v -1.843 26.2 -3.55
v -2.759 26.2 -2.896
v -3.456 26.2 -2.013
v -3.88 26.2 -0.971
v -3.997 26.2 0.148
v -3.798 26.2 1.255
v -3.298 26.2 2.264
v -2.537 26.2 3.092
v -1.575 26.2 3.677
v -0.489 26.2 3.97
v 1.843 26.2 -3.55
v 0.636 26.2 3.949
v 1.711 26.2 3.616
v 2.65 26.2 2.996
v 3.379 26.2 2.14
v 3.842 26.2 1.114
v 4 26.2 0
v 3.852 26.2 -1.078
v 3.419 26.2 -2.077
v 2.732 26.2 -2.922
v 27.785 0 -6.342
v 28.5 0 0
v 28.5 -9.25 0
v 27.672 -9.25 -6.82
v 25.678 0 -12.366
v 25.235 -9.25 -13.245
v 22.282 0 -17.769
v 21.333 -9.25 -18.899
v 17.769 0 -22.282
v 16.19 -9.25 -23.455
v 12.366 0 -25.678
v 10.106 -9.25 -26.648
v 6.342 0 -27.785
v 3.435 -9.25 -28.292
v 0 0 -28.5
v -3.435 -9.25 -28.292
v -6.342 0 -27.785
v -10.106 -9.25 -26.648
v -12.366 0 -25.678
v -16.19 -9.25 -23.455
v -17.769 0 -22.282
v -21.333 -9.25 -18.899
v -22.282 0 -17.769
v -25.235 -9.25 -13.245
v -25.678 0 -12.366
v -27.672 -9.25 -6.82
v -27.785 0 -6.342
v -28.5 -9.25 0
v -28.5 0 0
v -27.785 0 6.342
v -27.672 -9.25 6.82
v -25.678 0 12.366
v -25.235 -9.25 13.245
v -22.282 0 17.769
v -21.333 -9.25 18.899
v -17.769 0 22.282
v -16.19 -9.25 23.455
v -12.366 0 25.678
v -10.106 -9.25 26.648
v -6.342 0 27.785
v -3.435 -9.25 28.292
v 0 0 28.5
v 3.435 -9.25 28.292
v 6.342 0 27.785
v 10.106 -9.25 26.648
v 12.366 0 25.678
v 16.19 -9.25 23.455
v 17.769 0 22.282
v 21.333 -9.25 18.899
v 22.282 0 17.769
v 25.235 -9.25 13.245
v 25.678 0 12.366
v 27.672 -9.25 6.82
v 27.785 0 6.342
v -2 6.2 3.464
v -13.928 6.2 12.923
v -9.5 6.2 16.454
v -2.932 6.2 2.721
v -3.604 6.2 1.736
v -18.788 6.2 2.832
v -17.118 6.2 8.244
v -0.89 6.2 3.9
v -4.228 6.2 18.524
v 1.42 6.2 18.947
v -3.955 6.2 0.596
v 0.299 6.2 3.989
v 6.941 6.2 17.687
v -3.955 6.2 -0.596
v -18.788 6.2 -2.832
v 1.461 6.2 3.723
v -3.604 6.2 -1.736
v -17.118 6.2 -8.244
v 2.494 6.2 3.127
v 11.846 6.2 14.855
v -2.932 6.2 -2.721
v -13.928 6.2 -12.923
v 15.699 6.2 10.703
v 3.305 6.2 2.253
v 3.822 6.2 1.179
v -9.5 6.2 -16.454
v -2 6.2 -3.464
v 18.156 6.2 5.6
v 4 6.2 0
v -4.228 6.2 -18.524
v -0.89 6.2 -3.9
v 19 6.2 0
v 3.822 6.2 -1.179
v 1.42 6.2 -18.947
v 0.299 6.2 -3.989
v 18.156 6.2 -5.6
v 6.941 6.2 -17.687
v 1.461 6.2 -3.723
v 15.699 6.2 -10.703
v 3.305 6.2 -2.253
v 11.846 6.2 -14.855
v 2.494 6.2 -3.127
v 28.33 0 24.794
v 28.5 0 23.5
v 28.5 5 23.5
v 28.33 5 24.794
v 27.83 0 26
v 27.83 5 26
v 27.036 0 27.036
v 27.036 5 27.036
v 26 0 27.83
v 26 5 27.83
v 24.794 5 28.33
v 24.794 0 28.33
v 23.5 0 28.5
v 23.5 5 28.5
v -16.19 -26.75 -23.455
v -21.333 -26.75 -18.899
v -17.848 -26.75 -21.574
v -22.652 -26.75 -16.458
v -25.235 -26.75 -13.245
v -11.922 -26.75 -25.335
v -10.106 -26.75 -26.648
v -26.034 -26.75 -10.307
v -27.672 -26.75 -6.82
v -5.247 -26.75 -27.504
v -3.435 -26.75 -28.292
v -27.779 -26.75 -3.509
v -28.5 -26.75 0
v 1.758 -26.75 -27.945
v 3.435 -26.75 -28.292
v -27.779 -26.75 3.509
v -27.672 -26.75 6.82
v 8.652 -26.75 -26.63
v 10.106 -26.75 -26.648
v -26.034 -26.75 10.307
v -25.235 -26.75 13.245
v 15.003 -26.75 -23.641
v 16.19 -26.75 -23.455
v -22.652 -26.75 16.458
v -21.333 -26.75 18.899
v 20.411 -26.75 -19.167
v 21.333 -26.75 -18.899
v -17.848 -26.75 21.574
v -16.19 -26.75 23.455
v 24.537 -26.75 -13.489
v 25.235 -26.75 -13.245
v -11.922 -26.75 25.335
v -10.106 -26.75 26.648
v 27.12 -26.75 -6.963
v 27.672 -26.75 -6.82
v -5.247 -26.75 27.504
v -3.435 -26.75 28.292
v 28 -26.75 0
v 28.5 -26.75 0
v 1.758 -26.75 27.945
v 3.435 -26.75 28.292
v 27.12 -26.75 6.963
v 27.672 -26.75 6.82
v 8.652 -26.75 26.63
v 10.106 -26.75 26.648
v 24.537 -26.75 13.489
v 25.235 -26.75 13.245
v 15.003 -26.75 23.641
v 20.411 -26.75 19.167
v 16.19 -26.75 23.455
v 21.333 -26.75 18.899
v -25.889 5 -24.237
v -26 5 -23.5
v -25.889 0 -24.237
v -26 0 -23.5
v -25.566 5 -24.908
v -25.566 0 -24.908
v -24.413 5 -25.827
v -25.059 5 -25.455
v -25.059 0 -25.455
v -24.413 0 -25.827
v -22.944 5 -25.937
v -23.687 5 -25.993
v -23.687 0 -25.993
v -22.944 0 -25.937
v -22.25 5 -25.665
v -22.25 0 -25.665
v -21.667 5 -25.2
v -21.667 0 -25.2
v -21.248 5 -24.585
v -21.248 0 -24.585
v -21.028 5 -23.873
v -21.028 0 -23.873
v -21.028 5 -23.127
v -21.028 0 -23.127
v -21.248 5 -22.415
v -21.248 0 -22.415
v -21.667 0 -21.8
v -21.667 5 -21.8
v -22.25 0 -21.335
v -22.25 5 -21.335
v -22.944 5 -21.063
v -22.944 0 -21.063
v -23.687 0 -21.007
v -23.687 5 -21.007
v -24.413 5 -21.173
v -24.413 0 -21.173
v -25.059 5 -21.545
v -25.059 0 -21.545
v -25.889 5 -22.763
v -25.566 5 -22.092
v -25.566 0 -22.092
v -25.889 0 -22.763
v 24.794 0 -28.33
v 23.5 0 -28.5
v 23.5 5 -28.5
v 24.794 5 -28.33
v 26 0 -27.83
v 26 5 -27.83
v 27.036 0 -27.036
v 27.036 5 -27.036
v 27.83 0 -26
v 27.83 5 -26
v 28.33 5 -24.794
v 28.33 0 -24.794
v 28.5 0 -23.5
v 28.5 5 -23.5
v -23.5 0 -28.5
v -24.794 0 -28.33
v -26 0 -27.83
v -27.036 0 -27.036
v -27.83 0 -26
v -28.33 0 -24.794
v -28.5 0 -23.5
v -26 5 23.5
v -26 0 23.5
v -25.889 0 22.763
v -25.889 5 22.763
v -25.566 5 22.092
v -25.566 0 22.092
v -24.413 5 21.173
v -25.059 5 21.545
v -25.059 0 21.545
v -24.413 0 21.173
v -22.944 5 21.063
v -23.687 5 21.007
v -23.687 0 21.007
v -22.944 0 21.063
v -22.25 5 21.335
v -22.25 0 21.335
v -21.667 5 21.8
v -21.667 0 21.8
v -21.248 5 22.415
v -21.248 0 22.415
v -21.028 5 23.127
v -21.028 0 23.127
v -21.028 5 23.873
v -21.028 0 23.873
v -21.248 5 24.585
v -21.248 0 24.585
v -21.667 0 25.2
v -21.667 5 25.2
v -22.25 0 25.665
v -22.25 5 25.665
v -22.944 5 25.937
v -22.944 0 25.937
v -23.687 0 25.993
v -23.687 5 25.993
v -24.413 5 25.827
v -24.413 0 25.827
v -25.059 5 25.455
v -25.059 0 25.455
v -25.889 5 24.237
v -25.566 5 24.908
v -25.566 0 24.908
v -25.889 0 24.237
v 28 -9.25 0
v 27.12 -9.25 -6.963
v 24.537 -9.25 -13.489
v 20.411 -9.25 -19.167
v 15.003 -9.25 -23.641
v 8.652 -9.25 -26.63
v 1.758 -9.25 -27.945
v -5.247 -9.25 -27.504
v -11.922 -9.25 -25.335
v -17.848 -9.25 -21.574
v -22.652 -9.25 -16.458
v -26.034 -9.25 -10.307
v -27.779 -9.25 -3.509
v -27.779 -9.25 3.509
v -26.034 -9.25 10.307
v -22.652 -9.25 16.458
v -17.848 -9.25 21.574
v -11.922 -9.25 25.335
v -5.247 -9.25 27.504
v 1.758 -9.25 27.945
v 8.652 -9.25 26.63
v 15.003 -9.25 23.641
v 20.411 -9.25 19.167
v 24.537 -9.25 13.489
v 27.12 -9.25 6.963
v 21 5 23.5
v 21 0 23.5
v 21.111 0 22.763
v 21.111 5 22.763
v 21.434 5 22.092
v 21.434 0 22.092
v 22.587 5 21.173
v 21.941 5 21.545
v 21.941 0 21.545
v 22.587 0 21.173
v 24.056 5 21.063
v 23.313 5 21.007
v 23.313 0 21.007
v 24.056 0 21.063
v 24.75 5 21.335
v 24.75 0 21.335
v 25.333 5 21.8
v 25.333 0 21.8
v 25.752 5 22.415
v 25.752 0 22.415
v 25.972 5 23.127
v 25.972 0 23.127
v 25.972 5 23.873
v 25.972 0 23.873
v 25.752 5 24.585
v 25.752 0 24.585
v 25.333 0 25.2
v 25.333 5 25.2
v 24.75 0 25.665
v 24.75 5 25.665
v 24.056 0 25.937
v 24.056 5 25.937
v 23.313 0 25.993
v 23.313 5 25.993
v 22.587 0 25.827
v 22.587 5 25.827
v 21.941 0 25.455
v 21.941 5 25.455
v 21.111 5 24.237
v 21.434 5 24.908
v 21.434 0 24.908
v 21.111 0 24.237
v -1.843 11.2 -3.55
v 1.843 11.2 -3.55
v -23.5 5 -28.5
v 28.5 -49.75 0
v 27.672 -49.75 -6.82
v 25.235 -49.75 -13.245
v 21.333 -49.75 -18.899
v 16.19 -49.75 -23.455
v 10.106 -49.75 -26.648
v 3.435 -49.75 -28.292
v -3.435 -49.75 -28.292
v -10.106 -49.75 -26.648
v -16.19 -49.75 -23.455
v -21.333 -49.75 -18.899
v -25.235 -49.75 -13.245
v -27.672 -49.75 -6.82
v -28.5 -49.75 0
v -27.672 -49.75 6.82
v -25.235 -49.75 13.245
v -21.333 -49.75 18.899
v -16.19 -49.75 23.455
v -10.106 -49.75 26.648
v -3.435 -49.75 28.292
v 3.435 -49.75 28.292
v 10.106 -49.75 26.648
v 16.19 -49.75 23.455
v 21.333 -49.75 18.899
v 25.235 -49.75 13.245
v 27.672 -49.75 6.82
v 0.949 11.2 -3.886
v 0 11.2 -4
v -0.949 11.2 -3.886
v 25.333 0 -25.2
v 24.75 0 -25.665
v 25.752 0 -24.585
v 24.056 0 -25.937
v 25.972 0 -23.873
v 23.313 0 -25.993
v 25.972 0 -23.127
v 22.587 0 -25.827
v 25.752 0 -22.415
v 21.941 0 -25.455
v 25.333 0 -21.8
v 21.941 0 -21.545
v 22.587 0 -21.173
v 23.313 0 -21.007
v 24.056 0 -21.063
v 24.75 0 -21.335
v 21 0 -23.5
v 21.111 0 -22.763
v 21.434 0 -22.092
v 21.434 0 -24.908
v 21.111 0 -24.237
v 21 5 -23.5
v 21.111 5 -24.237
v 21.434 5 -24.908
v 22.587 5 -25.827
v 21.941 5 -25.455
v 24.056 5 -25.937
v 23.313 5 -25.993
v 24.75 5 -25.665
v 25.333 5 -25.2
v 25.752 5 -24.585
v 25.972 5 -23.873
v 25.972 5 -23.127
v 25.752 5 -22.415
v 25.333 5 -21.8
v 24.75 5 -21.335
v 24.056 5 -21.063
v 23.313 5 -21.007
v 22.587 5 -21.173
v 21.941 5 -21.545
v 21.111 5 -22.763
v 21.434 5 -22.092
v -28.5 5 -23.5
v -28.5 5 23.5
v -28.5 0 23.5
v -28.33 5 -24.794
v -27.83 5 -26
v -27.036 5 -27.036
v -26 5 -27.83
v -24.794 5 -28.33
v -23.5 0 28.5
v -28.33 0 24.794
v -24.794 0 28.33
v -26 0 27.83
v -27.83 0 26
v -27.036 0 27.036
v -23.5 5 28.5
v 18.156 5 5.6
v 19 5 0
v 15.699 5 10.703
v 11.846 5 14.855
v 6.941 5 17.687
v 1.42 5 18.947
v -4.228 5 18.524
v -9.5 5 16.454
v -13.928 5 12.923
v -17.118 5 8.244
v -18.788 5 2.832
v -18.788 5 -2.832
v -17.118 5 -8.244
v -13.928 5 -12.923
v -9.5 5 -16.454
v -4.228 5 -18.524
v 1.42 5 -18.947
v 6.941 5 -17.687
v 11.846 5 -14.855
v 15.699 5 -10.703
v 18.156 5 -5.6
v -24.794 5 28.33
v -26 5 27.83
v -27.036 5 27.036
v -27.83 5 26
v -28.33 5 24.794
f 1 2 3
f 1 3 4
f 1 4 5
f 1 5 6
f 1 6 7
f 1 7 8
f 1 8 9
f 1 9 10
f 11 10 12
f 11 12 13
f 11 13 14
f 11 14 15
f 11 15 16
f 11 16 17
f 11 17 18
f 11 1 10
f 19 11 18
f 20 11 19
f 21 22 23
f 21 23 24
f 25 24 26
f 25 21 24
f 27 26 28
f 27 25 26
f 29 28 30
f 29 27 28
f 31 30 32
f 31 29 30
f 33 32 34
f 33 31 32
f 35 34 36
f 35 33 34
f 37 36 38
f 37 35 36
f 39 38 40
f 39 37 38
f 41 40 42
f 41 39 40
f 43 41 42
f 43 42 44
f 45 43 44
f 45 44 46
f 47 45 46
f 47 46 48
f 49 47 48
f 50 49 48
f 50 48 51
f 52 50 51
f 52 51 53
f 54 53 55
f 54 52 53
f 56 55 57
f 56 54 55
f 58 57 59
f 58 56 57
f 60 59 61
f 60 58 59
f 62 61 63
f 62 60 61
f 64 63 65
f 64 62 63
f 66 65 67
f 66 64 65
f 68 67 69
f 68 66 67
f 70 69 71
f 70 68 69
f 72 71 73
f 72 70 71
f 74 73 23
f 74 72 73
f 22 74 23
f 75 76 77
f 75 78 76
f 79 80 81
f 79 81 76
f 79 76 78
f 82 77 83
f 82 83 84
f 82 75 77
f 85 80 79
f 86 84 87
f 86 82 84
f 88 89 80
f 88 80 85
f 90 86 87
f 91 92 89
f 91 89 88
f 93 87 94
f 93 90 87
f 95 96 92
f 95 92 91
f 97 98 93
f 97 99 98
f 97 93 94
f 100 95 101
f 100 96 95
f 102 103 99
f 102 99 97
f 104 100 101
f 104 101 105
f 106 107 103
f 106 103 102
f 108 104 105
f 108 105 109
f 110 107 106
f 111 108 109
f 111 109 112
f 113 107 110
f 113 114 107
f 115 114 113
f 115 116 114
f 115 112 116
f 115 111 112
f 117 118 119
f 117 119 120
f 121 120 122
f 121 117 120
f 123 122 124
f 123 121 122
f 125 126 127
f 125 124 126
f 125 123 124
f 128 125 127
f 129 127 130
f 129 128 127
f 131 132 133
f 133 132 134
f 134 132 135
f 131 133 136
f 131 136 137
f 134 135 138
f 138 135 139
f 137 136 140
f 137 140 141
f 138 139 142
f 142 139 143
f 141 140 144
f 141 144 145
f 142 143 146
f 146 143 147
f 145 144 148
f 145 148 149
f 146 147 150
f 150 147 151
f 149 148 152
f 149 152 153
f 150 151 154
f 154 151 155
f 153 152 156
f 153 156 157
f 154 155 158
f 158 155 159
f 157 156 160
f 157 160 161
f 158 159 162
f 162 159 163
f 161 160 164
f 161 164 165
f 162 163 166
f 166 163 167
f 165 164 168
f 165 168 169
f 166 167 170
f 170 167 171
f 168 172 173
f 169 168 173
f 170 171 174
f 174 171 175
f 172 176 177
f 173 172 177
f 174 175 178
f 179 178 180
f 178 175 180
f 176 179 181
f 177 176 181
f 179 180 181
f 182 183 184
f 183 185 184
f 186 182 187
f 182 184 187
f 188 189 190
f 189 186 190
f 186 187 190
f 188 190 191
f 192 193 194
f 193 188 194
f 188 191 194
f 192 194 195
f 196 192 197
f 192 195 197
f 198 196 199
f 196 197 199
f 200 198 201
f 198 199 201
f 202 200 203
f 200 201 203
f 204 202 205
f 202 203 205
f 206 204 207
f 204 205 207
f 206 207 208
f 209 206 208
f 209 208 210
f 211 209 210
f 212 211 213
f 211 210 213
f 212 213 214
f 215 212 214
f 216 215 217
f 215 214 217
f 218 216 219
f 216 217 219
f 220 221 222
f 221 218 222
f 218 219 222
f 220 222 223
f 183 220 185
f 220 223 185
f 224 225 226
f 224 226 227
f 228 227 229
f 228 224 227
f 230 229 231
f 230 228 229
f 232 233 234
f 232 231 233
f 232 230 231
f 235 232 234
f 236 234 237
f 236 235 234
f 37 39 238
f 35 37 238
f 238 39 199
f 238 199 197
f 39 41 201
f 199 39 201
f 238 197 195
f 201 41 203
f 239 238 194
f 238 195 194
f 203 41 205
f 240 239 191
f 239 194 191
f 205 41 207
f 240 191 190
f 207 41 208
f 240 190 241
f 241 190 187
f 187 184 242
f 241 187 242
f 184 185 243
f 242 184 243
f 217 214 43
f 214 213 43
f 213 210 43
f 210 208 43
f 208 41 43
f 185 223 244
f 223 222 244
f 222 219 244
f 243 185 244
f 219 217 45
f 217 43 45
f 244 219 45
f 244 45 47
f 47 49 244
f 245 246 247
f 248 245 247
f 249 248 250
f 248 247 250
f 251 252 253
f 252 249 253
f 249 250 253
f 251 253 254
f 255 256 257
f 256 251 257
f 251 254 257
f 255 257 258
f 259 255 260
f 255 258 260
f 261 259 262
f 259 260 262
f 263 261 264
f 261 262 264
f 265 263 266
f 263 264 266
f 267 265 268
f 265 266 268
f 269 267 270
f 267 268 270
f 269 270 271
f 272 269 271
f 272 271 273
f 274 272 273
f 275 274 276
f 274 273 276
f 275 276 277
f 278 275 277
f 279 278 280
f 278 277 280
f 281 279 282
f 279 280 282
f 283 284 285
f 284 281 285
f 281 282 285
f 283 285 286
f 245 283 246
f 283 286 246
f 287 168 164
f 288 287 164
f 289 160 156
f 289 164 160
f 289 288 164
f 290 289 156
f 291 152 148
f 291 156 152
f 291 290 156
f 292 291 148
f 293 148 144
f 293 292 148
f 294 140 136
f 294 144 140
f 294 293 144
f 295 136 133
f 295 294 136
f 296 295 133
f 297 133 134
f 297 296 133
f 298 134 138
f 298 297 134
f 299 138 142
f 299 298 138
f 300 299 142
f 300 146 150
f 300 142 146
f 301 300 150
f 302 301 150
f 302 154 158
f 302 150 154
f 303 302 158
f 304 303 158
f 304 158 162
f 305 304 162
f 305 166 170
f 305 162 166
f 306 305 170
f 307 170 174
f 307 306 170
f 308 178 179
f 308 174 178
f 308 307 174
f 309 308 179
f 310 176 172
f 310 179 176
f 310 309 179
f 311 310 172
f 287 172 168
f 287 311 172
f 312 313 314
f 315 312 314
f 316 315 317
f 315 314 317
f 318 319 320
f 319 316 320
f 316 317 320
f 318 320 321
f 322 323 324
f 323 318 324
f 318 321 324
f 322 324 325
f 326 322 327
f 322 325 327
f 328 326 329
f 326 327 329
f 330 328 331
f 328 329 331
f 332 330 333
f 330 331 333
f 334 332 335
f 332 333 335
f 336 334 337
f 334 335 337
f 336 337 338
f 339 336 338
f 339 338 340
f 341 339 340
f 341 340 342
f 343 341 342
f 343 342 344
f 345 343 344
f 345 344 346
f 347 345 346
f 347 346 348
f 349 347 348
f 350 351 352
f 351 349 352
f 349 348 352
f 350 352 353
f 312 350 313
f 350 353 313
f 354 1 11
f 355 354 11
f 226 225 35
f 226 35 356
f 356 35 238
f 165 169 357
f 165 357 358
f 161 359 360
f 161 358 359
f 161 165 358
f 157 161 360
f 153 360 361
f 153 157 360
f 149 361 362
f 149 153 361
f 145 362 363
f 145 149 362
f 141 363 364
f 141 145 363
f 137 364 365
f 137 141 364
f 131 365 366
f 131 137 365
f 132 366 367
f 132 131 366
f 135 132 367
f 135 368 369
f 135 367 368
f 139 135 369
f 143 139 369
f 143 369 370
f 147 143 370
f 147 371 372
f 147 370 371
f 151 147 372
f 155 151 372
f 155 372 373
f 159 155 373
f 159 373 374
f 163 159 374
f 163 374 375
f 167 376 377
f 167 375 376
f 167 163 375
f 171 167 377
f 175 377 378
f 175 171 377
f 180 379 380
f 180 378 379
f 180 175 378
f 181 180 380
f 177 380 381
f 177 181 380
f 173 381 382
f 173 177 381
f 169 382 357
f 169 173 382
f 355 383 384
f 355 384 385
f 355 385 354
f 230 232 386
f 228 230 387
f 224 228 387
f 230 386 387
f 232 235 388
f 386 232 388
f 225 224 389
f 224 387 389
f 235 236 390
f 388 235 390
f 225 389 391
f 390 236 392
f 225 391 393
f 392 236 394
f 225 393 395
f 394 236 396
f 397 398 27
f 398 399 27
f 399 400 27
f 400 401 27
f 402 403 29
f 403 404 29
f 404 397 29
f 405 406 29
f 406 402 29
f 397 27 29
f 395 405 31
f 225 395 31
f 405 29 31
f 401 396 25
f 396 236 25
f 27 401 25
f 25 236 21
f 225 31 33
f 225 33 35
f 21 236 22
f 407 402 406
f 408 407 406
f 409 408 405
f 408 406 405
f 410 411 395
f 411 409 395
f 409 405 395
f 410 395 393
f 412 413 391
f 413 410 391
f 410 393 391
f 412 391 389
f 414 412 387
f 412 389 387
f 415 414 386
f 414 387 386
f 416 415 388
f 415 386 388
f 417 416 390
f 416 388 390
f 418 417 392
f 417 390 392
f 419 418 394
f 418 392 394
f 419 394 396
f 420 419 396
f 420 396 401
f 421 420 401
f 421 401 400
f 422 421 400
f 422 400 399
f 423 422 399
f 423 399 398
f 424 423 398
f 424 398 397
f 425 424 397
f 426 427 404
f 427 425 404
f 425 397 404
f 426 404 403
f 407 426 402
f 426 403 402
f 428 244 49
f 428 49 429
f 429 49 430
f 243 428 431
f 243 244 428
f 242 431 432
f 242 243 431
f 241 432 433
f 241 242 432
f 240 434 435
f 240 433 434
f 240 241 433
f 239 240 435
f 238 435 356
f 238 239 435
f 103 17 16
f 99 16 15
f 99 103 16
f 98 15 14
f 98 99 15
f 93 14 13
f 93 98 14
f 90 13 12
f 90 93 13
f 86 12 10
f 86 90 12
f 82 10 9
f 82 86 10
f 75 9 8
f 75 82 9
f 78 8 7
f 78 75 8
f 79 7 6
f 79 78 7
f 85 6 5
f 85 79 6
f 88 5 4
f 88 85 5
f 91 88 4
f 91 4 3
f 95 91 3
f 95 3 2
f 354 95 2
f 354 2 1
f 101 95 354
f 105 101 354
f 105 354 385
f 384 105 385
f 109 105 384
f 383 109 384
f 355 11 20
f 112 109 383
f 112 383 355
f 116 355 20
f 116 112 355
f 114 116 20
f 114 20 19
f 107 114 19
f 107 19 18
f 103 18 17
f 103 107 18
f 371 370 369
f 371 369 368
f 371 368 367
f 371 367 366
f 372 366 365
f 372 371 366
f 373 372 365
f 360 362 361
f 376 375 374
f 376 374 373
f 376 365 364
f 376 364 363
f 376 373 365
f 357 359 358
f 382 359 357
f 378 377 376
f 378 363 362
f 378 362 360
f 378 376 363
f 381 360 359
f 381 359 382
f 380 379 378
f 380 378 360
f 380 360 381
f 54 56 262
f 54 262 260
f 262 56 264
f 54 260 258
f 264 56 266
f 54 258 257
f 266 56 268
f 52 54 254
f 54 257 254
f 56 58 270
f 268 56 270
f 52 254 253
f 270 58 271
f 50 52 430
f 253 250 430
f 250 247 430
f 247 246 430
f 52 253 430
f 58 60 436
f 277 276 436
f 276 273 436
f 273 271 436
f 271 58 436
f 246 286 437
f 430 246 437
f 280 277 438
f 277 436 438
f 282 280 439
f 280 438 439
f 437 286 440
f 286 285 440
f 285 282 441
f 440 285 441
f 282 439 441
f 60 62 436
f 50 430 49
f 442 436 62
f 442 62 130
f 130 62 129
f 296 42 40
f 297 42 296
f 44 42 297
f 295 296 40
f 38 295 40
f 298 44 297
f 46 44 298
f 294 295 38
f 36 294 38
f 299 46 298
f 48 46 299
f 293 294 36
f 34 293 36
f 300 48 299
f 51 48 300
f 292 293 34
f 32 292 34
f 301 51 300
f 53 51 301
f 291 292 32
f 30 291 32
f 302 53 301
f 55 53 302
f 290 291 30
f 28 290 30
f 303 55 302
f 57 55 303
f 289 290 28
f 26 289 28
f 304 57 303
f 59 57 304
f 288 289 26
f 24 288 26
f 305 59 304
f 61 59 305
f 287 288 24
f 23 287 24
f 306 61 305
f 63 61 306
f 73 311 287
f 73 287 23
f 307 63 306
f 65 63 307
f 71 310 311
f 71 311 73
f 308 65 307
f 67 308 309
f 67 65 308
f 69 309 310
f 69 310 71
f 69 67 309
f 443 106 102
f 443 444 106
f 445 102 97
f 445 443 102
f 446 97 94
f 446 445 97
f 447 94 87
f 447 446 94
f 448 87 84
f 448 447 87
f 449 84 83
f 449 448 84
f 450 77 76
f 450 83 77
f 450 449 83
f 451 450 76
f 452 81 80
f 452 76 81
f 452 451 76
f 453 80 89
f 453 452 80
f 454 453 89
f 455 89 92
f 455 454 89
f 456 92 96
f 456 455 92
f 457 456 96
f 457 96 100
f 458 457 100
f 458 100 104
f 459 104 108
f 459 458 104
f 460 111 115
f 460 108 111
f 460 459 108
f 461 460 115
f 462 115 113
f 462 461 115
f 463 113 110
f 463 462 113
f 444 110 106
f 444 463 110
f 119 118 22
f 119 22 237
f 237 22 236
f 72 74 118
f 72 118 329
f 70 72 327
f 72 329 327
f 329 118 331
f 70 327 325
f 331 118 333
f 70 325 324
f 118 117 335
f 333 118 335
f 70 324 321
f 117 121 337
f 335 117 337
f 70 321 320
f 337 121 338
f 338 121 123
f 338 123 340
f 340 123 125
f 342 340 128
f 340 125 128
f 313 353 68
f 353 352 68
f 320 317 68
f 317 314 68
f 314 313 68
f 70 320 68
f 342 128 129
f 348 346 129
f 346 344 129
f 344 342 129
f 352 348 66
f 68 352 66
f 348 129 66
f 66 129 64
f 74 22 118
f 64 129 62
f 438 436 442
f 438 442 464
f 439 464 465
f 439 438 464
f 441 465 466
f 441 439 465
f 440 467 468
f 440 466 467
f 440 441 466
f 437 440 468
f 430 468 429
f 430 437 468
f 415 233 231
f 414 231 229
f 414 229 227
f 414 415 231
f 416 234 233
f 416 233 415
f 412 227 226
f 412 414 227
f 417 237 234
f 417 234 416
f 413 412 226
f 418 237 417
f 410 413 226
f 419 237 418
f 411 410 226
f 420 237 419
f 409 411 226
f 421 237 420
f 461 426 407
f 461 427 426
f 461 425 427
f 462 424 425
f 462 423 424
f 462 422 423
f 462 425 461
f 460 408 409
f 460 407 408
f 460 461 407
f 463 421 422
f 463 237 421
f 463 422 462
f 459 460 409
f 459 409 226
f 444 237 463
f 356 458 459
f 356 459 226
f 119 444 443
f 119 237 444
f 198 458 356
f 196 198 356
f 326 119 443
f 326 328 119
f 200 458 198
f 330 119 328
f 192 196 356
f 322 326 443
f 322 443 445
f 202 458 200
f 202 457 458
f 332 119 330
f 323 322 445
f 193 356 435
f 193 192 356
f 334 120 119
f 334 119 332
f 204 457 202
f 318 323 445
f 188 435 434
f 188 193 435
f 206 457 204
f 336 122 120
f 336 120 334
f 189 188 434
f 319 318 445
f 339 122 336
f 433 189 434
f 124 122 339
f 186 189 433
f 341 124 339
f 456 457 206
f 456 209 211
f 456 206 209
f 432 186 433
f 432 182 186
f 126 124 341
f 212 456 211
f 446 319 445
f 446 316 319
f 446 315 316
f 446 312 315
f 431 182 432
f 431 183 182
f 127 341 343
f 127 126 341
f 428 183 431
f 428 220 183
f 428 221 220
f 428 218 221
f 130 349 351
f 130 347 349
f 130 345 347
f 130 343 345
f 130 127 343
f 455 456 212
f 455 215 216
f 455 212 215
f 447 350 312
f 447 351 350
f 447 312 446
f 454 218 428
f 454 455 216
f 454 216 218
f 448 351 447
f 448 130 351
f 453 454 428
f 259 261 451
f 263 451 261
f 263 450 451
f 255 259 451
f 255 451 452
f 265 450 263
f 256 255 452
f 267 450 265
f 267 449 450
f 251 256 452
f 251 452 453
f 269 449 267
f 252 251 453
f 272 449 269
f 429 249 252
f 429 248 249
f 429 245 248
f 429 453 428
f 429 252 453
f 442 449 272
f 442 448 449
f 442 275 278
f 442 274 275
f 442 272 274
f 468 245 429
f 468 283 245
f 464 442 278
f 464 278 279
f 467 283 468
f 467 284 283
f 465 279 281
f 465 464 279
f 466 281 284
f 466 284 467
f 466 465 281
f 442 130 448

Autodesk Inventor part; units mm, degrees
ref_plane "YZ Plane" through (0, 0, 0) normal (1, 0, 0) x (0, 1, 0)
ref_plane "XZ Plane" through (0, 0, 0) normal (0, 1, 0) x (-1, 0, 0)
ref_plane "XY Plane" through (0, 0, 0) normal (0, 0, 1) x (1, 0, 0)
sketch "草圖1" plane through (0, 0, 0) normal (0, 1, 0) x (-1, 0, 0)
  line L0 (23.5, 28.5) -> (-23.5, 28.5)
  line L1 (-28.5, 23.5) -> (-28.5, -23.5)
  line L2 (-23.5, -28.5) -> (23.5, -28.5)
  line L3 (28.5, -23.5) -> (28.5, 23.5)
  circle A0 centre (23.5, 23.5) radius 2.5
  circle A1 centre (23.5, -23.5) radius 2.5
  circle A2 centre (-23.5, -23.5) radius 2.5
  circle A3 centre (-23.5, 23.5) radius 2.5
  arc A4 (28.5, 23.5) -> (23.5, 28.5) centre (23.5, 23.5) ccw
  arc A5 (-23.5, 28.5) -> (-28.5, 23.5) centre (-23.5, 23.5) ccw
  arc A6 (-28.5, -23.5) -> (-23.5, -28.5) centre (-23.5, -23.5) ccw
  arc A7 (23.5, -28.5) -> (28.5, -23.5) centre (23.5, -23.5) ccw
  point P0 (0, 0)
  point P1 (28.5, 28.5)
  point P2 (-28.5, -28.5)
  point P3 (28.5, -28.5)
  dimension "d0" = 57
  dimension "d1" = 57
  dimension "d2" = 5
  dimension "d3" = 47
  dimension "d4" = 5
  dimension "d5" = 5
  dimension "d6" = 5
  dimension "d7" = 5
  dimension "d8" = 5
  dimension "d9" = 5
  dimension "d10" = 5
  dimension "d11" = 5
  dimension "d12" = 28.5
  dimension "d13" = 28.5
extrude "擠出1" add sketch "草圖1" along normal blind 5
sketch "草圖2" plane through (0, 5, 0) normal (0, 1, 0) x (1, 0, 0)
  circle A0 centre (0, 0) radius 19
  dimension "d16" = 38
extrude "擠出2" add sketch "草圖2" along normal blind 1.2
sketch "草圖3" plane through (0, 6.2, 0) normal (0, 1, 0) x (1, 0, 0)
  circle A0 centre (0, 0) radius 4
  dimension "d19" = 8
extrude "擠出3" add sketch "草圖3" along normal blind 20
sketch "草圖4" plane through (0, 26.2, 0) normal (0, 1, 0) x (1, 0, 0)
  line L0 (-1.8432, 3.55) -> (1.8432, 3.55)
  circle A0 centre (0, 0) radius 4 projected
  circle A1 centre (0, 0) radius 4 projected
  arc A2 (1.8432, 3.55) -> (-1.8432, 3.55) centre (0, 0) ccw
  line L1 (28.5, -23.5) -> (28.5, 23.5) projected
  point P0 (0, -4)
  dimension "d22" = 7.55
  dimension "d23" = 28.5
extrude "擠出4" cut sketch "草圖4" against normal blind 15 contours A0 L0 picked at (-0.3162, 3.662)
sketch "草圖5" plane through (0, 0, 0) normal (0, -1, 0) x (1, 0, 0)
  circle A0 centre (0, 0) radius 28.5
  dimension "d26" = 57
extrude "擠出5" add sketch "草圖5" along normal blind 9.25
sketch "草圖6" plane through (0, -9.25, 0) normal (0, -1, 0) x (1, 0, 0)
  circle A0 centre (0, 0) radius 28
  dimension "d29" = 56
extrude "擠出6" add sketch "草圖6" along normal blind 17.5
sketch "草圖7" plane through (0, -26.75, 0) normal (0, -1, 0) x (1, 0, 0)
  circle A0 centre (0, 0) radius 4 projected
  circle A1 centre (0, 0) radius 28.5
extrude "擠出7" add sketch "草圖7" along normal blind 23 contours A0 | A1
thread "螺紋1" size "M56x1.5" class "6g" standard "ANSI Metric M Profile" length 103
properties part number "BLDC_motor"
